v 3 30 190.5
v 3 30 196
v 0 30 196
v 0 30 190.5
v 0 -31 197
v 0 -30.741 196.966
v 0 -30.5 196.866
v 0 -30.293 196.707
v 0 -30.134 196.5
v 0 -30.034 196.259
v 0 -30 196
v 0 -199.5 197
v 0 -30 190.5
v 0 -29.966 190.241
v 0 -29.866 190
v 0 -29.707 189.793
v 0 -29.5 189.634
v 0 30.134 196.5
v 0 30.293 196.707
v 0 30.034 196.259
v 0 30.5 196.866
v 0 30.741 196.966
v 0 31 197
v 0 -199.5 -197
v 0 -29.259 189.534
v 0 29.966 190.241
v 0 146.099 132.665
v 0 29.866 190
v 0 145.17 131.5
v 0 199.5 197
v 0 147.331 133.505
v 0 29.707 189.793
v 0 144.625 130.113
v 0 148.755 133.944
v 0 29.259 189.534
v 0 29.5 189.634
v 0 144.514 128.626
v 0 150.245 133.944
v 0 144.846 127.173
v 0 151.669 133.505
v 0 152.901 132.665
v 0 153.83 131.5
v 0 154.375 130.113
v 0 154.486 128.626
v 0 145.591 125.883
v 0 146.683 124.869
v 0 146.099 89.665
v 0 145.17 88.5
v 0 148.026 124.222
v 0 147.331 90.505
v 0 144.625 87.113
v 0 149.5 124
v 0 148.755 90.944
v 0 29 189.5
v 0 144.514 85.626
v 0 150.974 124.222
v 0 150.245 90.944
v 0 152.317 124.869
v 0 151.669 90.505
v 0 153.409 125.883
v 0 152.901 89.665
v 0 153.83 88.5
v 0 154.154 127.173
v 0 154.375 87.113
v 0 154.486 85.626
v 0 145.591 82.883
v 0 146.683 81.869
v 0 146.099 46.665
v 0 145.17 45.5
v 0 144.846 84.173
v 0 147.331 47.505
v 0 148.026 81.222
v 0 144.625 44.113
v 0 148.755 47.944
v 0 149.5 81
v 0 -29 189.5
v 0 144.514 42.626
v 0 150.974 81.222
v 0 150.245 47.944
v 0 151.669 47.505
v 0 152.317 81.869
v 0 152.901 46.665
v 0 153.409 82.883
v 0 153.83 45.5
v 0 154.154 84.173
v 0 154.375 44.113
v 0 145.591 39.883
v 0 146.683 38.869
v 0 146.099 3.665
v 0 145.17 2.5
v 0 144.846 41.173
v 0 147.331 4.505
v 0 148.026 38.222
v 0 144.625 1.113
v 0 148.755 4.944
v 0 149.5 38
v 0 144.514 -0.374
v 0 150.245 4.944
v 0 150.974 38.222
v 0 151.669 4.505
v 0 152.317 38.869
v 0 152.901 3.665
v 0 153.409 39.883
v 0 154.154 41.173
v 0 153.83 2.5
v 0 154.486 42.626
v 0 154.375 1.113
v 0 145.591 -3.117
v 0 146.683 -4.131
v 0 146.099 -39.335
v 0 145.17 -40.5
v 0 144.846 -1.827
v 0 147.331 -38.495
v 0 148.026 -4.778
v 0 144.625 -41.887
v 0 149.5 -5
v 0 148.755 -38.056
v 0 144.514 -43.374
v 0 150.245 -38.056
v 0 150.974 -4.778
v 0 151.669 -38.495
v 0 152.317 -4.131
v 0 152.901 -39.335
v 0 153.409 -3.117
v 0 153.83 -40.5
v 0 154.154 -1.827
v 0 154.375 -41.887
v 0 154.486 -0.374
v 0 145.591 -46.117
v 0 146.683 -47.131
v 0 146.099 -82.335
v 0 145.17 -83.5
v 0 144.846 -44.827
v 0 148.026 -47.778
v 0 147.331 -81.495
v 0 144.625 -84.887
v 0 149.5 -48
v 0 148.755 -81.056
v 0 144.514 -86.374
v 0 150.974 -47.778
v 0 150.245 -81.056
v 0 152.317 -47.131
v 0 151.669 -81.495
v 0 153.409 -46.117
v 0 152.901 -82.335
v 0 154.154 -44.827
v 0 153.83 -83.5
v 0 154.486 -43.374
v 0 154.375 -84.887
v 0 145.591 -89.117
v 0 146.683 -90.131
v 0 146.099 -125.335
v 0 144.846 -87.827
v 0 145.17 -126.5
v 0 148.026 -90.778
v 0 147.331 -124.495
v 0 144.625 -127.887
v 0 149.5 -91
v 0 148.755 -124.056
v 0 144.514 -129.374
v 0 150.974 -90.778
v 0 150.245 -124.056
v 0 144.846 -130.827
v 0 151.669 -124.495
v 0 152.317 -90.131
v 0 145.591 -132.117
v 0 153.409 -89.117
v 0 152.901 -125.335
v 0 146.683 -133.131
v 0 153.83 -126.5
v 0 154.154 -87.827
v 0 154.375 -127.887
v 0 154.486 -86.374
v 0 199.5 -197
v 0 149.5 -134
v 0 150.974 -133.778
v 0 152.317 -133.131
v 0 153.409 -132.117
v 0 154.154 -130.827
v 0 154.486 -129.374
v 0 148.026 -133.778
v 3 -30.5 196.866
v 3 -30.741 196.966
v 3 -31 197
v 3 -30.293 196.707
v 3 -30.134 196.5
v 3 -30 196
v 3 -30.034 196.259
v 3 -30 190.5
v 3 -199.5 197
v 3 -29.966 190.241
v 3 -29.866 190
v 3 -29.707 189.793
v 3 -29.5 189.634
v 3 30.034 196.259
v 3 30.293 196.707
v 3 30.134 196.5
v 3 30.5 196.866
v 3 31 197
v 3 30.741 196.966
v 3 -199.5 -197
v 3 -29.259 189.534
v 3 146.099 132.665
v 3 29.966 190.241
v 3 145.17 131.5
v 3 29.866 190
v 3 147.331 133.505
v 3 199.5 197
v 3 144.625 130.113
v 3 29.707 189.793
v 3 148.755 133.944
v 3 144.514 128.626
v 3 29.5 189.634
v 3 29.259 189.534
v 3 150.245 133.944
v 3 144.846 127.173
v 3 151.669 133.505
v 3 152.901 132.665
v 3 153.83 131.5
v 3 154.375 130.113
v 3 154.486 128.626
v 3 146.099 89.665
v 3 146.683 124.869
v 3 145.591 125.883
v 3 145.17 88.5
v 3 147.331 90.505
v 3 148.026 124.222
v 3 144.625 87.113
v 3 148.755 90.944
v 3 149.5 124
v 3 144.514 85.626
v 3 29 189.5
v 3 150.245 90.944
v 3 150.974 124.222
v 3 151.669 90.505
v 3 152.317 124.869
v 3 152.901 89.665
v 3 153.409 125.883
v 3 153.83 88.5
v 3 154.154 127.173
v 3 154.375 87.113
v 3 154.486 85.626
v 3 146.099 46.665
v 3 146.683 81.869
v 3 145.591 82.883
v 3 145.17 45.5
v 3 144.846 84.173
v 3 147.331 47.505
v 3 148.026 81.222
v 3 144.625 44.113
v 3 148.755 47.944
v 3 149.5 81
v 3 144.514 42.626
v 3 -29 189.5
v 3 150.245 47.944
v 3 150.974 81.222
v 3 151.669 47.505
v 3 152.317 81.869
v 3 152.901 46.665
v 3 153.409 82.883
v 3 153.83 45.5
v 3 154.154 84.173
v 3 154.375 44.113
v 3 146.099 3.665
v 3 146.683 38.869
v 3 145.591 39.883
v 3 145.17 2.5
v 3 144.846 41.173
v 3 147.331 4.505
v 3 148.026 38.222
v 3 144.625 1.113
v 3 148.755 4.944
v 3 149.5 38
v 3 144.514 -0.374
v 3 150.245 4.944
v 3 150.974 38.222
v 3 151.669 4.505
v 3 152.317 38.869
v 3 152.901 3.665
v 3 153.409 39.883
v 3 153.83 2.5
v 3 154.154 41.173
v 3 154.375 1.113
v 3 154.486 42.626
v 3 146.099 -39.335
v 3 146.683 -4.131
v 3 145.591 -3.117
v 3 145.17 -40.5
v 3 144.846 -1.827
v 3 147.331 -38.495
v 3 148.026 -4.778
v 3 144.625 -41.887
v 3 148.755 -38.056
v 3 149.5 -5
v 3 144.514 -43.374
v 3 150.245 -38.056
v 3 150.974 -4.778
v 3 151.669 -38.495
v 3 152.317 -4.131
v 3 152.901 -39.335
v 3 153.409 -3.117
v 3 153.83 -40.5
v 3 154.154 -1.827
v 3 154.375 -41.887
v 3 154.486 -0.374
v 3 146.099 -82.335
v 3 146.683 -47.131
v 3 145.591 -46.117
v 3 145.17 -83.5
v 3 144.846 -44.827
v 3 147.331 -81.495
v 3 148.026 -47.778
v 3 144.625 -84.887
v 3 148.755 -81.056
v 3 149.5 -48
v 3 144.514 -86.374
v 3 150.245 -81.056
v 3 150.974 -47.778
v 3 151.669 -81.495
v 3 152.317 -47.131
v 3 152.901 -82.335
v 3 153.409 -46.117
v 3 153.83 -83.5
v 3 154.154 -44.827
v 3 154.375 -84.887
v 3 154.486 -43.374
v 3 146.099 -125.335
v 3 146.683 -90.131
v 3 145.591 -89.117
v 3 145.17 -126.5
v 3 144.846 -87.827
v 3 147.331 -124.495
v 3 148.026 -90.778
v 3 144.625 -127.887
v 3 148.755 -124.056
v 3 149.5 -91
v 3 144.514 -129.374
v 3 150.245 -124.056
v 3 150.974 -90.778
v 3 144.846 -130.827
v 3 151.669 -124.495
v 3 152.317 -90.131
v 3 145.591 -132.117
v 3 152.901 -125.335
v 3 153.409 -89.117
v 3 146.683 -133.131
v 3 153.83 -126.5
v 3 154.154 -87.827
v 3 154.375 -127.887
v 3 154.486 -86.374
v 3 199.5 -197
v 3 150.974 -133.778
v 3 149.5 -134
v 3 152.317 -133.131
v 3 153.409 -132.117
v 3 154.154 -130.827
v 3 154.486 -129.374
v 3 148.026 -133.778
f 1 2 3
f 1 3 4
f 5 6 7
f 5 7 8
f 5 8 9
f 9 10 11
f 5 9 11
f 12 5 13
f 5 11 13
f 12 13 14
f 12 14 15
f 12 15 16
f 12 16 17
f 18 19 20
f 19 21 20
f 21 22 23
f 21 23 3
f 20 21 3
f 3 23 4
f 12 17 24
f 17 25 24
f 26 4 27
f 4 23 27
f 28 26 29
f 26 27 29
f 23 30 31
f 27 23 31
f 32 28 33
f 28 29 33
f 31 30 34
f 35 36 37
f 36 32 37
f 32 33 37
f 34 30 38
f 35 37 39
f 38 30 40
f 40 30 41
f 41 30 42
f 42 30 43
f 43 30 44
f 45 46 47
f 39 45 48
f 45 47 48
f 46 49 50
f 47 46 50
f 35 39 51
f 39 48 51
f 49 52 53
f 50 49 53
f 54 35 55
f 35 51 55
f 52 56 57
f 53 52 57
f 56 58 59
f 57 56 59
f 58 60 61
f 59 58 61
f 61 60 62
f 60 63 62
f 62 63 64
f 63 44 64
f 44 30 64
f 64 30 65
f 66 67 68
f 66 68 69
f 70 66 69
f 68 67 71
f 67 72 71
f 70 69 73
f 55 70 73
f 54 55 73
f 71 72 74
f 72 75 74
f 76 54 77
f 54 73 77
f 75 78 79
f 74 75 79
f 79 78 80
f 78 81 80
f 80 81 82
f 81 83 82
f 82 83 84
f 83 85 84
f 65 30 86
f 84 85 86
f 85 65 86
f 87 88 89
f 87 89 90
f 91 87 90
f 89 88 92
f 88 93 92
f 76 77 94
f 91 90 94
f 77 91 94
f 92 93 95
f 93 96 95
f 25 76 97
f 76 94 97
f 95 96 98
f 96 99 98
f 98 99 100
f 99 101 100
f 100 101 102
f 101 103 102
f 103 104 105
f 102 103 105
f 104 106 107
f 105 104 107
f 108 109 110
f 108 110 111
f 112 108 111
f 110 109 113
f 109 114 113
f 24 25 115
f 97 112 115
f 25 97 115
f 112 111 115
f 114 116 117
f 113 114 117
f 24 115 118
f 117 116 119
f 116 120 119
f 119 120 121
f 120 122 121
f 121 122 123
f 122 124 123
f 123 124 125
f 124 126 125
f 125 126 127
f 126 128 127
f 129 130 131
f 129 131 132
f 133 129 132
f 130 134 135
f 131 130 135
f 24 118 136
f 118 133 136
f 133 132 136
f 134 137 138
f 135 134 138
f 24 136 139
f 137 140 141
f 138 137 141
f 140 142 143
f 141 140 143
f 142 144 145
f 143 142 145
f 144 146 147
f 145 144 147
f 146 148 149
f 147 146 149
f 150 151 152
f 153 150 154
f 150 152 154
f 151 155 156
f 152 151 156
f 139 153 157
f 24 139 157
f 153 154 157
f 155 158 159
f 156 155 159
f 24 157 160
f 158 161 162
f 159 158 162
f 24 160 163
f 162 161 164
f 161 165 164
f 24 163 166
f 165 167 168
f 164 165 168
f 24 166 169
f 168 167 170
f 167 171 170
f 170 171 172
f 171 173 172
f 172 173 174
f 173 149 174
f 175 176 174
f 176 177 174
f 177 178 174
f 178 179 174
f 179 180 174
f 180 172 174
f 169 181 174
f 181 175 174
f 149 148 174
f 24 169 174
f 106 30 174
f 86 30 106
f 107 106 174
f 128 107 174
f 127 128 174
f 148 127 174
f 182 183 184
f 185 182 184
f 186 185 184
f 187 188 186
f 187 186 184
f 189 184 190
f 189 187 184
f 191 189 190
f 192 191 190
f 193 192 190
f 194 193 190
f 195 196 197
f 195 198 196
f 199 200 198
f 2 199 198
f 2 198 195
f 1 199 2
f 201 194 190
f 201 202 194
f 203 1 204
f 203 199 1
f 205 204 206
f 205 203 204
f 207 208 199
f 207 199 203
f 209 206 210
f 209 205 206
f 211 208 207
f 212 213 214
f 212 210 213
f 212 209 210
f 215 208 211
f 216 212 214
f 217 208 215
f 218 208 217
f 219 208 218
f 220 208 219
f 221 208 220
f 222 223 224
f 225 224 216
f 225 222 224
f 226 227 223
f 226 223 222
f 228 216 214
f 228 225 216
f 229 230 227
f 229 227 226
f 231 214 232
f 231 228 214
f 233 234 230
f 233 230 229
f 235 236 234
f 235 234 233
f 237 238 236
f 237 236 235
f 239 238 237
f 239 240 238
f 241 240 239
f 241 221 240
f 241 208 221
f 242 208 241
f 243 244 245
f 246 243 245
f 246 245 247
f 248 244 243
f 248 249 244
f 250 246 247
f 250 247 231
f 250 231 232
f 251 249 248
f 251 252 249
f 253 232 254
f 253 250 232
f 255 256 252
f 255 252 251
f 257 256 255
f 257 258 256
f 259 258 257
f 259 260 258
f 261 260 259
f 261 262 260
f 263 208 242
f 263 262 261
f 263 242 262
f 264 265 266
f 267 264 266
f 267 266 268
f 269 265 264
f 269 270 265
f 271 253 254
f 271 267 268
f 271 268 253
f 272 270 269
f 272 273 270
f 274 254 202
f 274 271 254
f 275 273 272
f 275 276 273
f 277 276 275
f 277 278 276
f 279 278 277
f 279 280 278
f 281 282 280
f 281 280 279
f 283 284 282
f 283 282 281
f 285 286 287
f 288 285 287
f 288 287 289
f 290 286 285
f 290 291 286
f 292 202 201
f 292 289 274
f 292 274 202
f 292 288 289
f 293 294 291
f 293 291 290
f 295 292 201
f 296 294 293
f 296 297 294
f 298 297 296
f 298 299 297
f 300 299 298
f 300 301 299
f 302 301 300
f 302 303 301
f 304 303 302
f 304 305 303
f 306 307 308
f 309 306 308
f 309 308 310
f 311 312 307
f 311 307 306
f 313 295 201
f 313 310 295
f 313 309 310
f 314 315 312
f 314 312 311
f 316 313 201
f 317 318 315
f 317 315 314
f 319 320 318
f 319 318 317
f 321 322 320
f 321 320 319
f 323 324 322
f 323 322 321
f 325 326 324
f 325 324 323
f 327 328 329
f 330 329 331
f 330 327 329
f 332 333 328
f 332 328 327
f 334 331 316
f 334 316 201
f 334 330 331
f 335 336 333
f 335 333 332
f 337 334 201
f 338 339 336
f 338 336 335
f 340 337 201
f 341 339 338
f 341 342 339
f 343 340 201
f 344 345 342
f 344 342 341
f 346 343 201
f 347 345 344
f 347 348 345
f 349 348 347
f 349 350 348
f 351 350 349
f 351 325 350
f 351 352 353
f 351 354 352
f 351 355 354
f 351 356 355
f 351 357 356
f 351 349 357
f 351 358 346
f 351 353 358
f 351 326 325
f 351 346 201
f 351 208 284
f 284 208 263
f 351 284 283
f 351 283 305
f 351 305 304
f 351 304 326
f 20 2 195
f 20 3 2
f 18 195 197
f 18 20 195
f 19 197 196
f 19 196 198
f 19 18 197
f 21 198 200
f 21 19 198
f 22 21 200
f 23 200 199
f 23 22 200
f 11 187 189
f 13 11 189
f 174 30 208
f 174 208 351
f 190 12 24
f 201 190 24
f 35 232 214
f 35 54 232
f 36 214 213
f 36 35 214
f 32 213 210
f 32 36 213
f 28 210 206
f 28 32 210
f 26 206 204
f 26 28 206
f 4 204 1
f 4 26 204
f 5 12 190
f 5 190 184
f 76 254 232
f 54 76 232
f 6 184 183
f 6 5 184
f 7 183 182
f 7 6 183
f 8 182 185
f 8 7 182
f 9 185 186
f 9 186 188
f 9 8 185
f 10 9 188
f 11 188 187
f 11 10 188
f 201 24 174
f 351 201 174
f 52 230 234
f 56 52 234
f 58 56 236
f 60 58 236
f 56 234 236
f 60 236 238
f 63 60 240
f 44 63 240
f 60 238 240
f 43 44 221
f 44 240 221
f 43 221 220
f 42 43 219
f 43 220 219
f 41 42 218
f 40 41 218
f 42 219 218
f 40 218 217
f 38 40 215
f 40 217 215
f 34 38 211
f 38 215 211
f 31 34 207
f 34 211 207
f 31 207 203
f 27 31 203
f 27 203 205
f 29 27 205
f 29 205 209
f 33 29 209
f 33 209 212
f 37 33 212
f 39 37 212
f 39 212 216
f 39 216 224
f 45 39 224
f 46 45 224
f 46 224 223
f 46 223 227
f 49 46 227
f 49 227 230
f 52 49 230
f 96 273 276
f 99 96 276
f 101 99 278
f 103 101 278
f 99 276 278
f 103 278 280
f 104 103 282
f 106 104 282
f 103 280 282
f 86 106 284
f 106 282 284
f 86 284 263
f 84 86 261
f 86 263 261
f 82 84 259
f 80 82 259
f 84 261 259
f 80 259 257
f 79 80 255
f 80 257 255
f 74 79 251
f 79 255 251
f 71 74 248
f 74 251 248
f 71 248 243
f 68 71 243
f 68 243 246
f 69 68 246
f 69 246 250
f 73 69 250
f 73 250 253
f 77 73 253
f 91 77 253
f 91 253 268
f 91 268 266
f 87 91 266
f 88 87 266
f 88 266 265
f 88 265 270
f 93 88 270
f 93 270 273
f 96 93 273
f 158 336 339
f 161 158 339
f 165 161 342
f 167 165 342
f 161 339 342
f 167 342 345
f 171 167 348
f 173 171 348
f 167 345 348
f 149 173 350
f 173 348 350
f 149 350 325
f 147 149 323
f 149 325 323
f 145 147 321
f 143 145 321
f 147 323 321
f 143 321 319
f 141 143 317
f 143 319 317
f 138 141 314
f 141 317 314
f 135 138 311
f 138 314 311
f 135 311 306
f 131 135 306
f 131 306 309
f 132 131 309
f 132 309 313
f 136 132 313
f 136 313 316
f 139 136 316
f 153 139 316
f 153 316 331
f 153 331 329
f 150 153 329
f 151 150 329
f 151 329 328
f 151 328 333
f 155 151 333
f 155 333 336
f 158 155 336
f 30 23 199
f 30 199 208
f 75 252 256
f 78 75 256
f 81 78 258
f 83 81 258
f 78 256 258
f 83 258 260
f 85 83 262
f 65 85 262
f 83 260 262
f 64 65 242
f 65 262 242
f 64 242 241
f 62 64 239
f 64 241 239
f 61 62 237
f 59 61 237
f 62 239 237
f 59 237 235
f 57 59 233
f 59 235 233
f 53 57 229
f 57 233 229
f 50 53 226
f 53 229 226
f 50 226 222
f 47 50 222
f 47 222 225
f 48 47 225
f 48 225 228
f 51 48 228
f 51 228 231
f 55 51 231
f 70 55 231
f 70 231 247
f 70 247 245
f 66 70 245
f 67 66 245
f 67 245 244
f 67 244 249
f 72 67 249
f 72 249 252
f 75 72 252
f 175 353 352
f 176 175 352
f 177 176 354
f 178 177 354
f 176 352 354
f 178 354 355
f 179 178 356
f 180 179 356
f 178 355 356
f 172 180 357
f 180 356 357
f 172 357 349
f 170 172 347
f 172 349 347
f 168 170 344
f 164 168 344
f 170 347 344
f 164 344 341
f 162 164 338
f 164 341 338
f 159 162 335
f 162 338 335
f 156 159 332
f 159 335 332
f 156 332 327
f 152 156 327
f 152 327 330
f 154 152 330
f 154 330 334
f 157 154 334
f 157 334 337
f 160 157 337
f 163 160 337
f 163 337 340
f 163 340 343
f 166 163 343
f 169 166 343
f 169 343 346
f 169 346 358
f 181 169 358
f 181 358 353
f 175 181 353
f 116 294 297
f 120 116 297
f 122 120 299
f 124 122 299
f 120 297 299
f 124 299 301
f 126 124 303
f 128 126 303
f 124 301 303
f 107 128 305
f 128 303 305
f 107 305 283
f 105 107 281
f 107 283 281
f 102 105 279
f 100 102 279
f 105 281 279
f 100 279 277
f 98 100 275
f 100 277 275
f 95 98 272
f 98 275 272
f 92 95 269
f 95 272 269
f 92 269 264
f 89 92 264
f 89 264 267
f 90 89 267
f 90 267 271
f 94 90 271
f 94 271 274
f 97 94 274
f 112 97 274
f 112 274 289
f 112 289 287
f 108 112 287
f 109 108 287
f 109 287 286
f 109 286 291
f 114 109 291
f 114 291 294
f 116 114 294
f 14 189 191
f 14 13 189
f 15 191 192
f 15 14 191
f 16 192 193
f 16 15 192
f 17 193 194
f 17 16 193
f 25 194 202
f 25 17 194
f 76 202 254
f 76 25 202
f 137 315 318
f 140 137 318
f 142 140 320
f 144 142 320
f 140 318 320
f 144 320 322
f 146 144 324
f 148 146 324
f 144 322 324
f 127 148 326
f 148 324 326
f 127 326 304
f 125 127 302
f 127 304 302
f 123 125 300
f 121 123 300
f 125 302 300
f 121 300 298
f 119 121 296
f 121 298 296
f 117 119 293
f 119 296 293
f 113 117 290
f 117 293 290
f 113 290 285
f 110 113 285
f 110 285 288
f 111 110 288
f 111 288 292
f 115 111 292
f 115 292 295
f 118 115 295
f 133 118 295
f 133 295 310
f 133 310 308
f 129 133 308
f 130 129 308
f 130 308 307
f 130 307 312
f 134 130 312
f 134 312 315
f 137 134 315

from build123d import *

# Parameters (mm, degrees)
SKETCH_1_W          = 394
SKETCH_1_H          = 399
EXTRUDE_1_DEPTH     = 3
SKETCH_2_R          = 5
SKETCH_2_W          = 7.5
SKETCH_2_H          = 60
CUT_EXTRUDE_1_DEPTH = 281.389461286
FILLET_1_R          = 1


with BuildPart() as part:
    # 草圖1 → 填料-伸長1 (new body)
    with BuildSketch(Plane(origin=(0, 0, 0), x_dir=(0, 0, -1), z_dir=(1, 0, 0))):
        Rectangle(SKETCH_1_W, SKETCH_1_H)
    extrude(amount=EXTRUDE_1_DEPTH)

    # 草圖2 → 除料-伸長1 (cut, through all)
    with BuildSketch(Plane(origin=(3, 0, 0), x_dir=(0, 0, -1), z_dir=(1, 0, 0))):
        with Locations((-129, 149.5)):
            Circle(SKETCH_2_R)
        with Locations((-86, 149.5)):
            Circle(SKETCH_2_R)
        with Locations((-43, 149.5)):
            Circle(SKETCH_2_R)
        with Locations((0, 149.5)):
            Circle(SKETCH_2_R)
        with Locations((43, 149.5)):
            Circle(SKETCH_2_R)
        with Locations((86, 149.5)):
            Circle(SKETCH_2_R)
        with Locations((129, 149.5)):
            Circle(SKETCH_2_R)
        with Locations((-193.25, 0)):
            Rectangle(SKETCH_2_W, SKETCH_2_H)
    extrude(amount=-CUT_EXTRUDE_1_DEPTH, mode=Mode.SUBTRACT)

    # 圓角1
    fillet_1_edges = [part.edges().sort_by_distance(p)[0] for p in [
        (1.5, -30, 197),
        (1.5, 30, 197),
        (1.5, 30, 189.5),
        (1.5, -30, 189.5),
    ]]
    fillet(fillet_1_edges, radius=FILLET_1_R)


solid = part.part
